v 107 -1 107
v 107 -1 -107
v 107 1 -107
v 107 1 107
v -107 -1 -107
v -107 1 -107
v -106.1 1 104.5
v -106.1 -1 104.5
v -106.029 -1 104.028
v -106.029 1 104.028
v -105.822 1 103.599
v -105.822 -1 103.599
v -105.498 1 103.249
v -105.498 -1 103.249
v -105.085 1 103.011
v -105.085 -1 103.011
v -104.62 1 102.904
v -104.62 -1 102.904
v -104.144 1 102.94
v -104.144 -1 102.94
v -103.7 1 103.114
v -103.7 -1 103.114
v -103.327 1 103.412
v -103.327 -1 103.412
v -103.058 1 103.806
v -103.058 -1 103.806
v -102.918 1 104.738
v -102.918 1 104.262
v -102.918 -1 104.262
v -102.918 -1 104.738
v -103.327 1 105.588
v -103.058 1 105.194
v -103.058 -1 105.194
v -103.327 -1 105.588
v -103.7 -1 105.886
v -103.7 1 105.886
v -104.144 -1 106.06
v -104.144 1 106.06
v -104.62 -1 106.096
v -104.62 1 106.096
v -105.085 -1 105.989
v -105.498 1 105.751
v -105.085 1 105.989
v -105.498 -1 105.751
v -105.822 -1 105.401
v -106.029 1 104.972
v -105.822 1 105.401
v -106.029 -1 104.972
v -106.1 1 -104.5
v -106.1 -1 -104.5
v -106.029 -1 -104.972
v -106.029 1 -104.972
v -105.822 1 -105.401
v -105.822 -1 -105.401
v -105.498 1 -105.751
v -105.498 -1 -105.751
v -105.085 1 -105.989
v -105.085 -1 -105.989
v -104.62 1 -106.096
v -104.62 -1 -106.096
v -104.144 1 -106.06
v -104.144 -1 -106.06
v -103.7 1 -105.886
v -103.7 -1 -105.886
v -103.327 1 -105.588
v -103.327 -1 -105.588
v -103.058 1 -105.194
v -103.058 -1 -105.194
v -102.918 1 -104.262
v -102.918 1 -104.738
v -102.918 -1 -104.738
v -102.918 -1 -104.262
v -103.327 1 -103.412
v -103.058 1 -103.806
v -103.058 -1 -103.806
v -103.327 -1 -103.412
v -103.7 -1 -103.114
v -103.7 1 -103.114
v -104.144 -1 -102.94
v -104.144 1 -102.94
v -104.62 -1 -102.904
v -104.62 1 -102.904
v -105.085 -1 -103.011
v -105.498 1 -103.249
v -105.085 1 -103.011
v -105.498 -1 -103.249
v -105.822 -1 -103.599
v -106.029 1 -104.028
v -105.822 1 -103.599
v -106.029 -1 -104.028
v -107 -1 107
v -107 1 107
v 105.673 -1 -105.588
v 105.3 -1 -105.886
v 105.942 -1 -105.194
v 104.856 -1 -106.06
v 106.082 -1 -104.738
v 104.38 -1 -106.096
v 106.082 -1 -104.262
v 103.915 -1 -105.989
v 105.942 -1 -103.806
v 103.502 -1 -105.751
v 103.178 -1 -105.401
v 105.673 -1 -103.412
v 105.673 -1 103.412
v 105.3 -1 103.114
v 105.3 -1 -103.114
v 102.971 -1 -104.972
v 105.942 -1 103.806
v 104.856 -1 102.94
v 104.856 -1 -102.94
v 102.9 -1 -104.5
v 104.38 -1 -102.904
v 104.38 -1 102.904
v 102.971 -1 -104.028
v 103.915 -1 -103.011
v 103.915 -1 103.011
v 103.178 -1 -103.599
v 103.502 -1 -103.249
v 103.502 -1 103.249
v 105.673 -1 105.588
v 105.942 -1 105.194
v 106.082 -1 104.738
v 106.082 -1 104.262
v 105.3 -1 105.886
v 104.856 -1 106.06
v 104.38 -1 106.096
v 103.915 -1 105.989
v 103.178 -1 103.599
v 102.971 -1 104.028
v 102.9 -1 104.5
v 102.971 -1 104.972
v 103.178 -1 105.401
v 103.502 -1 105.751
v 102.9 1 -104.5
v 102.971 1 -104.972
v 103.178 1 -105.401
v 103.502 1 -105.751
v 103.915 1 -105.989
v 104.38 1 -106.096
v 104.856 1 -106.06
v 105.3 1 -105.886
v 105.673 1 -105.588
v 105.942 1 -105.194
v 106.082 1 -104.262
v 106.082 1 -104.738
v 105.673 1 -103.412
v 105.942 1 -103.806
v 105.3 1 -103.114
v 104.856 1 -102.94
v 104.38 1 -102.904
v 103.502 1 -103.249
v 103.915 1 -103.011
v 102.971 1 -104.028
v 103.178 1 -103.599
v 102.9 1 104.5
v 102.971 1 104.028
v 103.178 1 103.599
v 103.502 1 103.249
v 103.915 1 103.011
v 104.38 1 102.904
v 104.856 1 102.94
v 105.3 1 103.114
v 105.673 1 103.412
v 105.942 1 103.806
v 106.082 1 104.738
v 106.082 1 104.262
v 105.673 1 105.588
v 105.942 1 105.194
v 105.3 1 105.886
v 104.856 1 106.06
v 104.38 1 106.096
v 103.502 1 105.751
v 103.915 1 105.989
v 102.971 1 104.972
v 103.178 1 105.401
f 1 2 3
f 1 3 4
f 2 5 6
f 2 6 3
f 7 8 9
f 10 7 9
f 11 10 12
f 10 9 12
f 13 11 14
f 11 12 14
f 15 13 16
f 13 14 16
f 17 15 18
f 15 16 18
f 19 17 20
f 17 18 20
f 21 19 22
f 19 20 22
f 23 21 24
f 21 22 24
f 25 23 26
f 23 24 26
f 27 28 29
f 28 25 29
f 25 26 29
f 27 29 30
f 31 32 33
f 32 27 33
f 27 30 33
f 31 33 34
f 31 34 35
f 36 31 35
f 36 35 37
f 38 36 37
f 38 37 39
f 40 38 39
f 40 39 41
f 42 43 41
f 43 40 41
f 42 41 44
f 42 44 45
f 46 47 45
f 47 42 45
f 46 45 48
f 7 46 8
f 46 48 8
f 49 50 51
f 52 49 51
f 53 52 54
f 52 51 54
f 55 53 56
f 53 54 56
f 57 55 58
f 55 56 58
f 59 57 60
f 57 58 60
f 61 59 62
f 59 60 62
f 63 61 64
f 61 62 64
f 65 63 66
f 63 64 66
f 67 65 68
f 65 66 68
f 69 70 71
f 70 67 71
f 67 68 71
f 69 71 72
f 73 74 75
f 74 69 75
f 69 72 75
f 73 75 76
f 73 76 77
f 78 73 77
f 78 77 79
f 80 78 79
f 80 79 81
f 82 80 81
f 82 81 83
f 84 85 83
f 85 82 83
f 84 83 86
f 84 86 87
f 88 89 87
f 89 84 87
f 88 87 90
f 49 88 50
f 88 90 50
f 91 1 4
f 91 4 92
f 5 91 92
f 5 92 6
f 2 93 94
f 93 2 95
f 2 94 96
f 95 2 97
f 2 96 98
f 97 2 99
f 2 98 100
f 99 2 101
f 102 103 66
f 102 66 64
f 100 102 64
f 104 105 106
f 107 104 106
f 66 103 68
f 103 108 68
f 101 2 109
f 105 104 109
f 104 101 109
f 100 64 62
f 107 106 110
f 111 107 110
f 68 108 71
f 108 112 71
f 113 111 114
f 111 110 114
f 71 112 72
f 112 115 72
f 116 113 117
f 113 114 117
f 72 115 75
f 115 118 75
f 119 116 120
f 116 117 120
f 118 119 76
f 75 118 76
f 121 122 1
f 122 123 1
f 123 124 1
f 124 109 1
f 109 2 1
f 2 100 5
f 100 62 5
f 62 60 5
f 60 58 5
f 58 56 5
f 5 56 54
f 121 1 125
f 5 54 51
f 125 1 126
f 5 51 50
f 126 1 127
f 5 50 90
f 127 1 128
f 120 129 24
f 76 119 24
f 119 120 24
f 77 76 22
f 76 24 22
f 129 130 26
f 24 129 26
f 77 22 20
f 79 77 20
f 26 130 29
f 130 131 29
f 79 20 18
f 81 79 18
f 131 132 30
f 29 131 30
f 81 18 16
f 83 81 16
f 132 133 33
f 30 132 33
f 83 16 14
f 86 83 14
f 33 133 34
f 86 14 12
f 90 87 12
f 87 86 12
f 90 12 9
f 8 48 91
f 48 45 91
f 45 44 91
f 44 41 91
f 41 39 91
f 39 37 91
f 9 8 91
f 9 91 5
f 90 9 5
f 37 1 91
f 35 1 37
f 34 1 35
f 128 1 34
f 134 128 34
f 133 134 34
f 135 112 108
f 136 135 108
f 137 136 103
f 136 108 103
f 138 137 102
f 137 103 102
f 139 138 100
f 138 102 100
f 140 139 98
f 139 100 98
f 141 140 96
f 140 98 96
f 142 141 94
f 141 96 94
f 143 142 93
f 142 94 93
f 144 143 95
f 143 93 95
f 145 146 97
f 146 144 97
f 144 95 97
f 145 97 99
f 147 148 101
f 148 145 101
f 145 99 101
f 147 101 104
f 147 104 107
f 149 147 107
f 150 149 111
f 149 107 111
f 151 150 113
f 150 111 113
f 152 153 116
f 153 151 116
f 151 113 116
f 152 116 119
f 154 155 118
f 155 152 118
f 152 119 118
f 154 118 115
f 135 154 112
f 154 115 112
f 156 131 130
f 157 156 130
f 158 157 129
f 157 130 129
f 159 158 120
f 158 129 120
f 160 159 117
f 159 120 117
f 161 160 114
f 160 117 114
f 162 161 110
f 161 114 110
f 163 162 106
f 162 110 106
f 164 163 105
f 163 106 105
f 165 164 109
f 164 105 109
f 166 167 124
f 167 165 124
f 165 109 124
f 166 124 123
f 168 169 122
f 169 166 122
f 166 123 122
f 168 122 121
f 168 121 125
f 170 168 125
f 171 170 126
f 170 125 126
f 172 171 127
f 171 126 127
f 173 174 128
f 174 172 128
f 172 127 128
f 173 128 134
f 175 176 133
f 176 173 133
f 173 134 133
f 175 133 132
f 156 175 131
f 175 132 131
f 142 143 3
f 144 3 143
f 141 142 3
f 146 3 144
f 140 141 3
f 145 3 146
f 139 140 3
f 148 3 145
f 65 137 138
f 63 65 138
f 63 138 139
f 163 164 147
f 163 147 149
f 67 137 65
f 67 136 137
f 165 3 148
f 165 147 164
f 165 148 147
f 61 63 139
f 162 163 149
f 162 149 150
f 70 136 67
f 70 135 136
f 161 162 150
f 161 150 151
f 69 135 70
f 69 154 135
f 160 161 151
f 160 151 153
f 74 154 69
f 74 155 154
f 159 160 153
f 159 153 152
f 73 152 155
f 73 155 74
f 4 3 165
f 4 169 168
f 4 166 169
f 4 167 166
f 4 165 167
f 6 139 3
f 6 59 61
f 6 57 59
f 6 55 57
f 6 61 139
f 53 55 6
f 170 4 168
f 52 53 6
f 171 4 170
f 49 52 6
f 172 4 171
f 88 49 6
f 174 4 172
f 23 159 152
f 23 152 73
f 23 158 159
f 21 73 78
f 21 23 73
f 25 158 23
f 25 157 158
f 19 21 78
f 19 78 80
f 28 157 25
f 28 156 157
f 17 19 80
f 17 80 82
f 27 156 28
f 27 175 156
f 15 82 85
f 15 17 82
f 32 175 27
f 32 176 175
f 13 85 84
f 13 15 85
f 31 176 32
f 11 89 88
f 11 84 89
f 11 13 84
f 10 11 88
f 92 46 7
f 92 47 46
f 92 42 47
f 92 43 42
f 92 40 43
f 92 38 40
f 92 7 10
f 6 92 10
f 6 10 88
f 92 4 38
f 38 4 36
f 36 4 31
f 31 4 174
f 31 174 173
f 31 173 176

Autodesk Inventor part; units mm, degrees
ref_plane "YZ Plane" through (0, 0, 0) normal (1, 0, 0) x (0, 1, 0)
ref_plane "XZ Plane" through (0, 0, 0) normal (0, 1, 0) x (-1, 0, 0)
ref_plane "XY Plane" through (0, 0, 0) normal (0, 0, 1) x (1, 0, 0)
sketch "Sketch1" plane through (0, 0, 0) normal (0, 1, 0) x (-1, 0, 0)
  line L0 (107, -107) -> (-107, -107)
  line L1 (-107, -107) -> (-107, 107)
  line L2 (-107, 107) -> (107, 107)
  line L3 (107, 107) -> (107, -107)
  line L4 (107, -107) -> (-107, 107) construction
  line L5 (-107, -107) -> (107, 107) construction
  line L6 (104.5, 104.5) -> (-104.5, 104.5) construction
  line L7 (-104.5, 104.5) -> (-104.5, -104.5) construction
  line L8 (-104.5, -104.5) -> (104.5, -104.5) construction
  line L9 (104.5, -104.5) -> (104.5, 104.5) construction
  line L10 (104.5, 104.5) -> (-104.5, -104.5) construction
  line L11 (-104.5, 104.5) -> (104.5, -104.5) construction
  circle A0 centre (104.5, -104.5) radius 1.6
  circle A1 centre (-104.5, -104.5) radius 1.6
  circle A2 centre (-104.5, 104.5) radius 1.6
  circle A3 centre (104.5, 104.5) radius 1.6
  point P0 (0, 0)
  dimension "d0" = 214
  dimension "d1" = 214
  dimension "d2" = 209
  dimension "d3" = 209
  dimension "d4" = 3.2
  dimension "d5" = 3.2
  dimension "d6" = 3.2
  dimension "d7" = 3.2
extrude "Extrusion1" add sketch "Sketch1" along normal mid plane 2
sketch "Sketch2" plane through (0, 1, 0) normal (0, 1, 0) x (1, 0, 0)
  line L0 (58.5536, -54.476) -> (-58.5536, -54.476)
  line L1 (-58.5536, -54.476) -> (-58.5536, 54.476)
  line L2 (-58.5536, 54.476) -> (58.5536, 54.476)
  line L3 (58.5536, 54.476) -> (58.5536, -54.476)
  line L4 (58.5536, -54.476) -> (-58.5536, 54.476) construction
  line L5 (-58.5536, -54.476) -> (58.5536, 54.476) construction
  line L6 (107, 107) -> (-107, 107) projected
  line L7 (-107, 107) -> (106.5967, 107.4017) construction
  line L8 (106.5967, 107.4017) -> (107, -107) construction
  line L9 (107, -107) -> (-106.5967, -107.4017) construction
  line L10 (-106.5967, -107.4017) -> (-107, 107) construction
  point P0 (0, 0)
decal "Decal1"
properties part number "HotBed_PCB_LM6020" material "Copper"
